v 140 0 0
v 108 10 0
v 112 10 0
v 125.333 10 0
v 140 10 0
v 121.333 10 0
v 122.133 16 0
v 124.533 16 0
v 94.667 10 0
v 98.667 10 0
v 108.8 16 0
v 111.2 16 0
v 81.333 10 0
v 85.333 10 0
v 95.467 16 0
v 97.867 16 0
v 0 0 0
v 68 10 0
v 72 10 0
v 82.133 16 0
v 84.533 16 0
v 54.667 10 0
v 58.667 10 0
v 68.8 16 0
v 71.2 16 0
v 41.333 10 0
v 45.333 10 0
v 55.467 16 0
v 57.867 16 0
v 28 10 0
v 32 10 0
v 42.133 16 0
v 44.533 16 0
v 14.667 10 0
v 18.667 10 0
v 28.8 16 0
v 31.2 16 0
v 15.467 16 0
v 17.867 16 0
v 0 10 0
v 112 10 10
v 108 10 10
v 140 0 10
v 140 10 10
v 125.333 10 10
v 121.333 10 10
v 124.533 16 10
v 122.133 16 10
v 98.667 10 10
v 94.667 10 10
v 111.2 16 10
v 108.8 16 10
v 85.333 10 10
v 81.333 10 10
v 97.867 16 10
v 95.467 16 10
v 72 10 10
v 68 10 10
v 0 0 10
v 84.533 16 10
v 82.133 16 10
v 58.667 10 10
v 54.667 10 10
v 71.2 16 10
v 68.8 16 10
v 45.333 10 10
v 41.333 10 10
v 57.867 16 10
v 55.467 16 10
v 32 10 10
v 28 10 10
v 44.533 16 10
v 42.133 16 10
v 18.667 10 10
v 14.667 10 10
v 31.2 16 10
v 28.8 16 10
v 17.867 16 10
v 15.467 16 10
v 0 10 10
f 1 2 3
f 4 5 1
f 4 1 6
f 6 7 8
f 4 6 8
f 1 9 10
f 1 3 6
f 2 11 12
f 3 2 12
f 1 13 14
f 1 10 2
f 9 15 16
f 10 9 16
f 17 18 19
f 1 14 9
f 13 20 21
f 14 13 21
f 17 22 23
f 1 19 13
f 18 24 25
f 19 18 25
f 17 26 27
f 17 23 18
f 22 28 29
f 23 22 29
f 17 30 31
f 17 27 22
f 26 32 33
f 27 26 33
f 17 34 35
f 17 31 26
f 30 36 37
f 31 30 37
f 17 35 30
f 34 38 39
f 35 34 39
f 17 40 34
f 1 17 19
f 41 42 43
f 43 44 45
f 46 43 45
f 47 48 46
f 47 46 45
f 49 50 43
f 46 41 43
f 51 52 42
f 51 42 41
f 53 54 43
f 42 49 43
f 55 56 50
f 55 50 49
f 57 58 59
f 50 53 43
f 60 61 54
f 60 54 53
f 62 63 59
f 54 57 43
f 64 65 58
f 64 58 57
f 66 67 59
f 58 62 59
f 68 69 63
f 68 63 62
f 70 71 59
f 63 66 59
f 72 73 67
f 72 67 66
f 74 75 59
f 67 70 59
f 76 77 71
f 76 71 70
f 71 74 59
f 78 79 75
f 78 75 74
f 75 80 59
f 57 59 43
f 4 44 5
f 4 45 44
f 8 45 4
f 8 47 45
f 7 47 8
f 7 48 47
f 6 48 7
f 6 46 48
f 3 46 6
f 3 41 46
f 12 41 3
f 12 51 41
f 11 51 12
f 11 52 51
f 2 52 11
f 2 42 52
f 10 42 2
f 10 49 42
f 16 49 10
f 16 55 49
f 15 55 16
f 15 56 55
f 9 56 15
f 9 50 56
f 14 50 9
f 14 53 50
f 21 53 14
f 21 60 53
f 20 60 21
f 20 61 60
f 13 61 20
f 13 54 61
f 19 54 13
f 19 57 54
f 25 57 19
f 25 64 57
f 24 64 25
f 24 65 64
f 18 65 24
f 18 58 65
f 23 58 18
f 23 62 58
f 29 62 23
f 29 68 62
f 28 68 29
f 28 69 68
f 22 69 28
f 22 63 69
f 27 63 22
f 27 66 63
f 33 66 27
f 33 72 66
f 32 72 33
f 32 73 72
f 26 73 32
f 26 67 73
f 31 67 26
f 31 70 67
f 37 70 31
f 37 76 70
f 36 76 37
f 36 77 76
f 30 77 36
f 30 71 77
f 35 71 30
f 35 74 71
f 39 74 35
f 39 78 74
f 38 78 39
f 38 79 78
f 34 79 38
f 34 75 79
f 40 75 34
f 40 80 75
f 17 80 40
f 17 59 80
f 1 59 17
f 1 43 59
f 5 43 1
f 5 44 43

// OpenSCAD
$fn = 32;

// ----------------------------------------------------------------------
// Gear rack: 9 teeth on a 140 mm bar, pitch 13.33 mm
// ----------------------------------------------------------------------

// --- parameters (mm) ---
profile_height = 10;      // extrusion height
profile_points = 40;      // points of the closed outline

profile = [[0, 0], [140, 0], [140, 10], [125.333, 10], [124.533, 16], [122.133, 16], [121.333, 10], [112, 10], [111.2, 16], [108.8, 16], [108, 10], [98.667, 10], [97.867, 16], [95.467, 16], [94.667, 10], [85.333, 10], [84.533, 16], [82.133, 16], [81.333, 10], [72, 10], [71.2, 16], [68.8, 16], [68, 10], [58.667, 10], [57.867, 16], [55.467, 16], [54.667, 10], [45.333, 10], [44.533, 16], [42.133, 16], [41.333, 10], [32, 10], [31.2, 16], [28.8, 16], [28, 10], [18.667, 10], [17.867, 16], [15.467, 16], [14.667, 10], [0, 10]];  // single closed polygon, 40 points, counter clockwise

// --- the one profile operation ---
linear_extrude(height = profile_height) polygon(points = profile);
